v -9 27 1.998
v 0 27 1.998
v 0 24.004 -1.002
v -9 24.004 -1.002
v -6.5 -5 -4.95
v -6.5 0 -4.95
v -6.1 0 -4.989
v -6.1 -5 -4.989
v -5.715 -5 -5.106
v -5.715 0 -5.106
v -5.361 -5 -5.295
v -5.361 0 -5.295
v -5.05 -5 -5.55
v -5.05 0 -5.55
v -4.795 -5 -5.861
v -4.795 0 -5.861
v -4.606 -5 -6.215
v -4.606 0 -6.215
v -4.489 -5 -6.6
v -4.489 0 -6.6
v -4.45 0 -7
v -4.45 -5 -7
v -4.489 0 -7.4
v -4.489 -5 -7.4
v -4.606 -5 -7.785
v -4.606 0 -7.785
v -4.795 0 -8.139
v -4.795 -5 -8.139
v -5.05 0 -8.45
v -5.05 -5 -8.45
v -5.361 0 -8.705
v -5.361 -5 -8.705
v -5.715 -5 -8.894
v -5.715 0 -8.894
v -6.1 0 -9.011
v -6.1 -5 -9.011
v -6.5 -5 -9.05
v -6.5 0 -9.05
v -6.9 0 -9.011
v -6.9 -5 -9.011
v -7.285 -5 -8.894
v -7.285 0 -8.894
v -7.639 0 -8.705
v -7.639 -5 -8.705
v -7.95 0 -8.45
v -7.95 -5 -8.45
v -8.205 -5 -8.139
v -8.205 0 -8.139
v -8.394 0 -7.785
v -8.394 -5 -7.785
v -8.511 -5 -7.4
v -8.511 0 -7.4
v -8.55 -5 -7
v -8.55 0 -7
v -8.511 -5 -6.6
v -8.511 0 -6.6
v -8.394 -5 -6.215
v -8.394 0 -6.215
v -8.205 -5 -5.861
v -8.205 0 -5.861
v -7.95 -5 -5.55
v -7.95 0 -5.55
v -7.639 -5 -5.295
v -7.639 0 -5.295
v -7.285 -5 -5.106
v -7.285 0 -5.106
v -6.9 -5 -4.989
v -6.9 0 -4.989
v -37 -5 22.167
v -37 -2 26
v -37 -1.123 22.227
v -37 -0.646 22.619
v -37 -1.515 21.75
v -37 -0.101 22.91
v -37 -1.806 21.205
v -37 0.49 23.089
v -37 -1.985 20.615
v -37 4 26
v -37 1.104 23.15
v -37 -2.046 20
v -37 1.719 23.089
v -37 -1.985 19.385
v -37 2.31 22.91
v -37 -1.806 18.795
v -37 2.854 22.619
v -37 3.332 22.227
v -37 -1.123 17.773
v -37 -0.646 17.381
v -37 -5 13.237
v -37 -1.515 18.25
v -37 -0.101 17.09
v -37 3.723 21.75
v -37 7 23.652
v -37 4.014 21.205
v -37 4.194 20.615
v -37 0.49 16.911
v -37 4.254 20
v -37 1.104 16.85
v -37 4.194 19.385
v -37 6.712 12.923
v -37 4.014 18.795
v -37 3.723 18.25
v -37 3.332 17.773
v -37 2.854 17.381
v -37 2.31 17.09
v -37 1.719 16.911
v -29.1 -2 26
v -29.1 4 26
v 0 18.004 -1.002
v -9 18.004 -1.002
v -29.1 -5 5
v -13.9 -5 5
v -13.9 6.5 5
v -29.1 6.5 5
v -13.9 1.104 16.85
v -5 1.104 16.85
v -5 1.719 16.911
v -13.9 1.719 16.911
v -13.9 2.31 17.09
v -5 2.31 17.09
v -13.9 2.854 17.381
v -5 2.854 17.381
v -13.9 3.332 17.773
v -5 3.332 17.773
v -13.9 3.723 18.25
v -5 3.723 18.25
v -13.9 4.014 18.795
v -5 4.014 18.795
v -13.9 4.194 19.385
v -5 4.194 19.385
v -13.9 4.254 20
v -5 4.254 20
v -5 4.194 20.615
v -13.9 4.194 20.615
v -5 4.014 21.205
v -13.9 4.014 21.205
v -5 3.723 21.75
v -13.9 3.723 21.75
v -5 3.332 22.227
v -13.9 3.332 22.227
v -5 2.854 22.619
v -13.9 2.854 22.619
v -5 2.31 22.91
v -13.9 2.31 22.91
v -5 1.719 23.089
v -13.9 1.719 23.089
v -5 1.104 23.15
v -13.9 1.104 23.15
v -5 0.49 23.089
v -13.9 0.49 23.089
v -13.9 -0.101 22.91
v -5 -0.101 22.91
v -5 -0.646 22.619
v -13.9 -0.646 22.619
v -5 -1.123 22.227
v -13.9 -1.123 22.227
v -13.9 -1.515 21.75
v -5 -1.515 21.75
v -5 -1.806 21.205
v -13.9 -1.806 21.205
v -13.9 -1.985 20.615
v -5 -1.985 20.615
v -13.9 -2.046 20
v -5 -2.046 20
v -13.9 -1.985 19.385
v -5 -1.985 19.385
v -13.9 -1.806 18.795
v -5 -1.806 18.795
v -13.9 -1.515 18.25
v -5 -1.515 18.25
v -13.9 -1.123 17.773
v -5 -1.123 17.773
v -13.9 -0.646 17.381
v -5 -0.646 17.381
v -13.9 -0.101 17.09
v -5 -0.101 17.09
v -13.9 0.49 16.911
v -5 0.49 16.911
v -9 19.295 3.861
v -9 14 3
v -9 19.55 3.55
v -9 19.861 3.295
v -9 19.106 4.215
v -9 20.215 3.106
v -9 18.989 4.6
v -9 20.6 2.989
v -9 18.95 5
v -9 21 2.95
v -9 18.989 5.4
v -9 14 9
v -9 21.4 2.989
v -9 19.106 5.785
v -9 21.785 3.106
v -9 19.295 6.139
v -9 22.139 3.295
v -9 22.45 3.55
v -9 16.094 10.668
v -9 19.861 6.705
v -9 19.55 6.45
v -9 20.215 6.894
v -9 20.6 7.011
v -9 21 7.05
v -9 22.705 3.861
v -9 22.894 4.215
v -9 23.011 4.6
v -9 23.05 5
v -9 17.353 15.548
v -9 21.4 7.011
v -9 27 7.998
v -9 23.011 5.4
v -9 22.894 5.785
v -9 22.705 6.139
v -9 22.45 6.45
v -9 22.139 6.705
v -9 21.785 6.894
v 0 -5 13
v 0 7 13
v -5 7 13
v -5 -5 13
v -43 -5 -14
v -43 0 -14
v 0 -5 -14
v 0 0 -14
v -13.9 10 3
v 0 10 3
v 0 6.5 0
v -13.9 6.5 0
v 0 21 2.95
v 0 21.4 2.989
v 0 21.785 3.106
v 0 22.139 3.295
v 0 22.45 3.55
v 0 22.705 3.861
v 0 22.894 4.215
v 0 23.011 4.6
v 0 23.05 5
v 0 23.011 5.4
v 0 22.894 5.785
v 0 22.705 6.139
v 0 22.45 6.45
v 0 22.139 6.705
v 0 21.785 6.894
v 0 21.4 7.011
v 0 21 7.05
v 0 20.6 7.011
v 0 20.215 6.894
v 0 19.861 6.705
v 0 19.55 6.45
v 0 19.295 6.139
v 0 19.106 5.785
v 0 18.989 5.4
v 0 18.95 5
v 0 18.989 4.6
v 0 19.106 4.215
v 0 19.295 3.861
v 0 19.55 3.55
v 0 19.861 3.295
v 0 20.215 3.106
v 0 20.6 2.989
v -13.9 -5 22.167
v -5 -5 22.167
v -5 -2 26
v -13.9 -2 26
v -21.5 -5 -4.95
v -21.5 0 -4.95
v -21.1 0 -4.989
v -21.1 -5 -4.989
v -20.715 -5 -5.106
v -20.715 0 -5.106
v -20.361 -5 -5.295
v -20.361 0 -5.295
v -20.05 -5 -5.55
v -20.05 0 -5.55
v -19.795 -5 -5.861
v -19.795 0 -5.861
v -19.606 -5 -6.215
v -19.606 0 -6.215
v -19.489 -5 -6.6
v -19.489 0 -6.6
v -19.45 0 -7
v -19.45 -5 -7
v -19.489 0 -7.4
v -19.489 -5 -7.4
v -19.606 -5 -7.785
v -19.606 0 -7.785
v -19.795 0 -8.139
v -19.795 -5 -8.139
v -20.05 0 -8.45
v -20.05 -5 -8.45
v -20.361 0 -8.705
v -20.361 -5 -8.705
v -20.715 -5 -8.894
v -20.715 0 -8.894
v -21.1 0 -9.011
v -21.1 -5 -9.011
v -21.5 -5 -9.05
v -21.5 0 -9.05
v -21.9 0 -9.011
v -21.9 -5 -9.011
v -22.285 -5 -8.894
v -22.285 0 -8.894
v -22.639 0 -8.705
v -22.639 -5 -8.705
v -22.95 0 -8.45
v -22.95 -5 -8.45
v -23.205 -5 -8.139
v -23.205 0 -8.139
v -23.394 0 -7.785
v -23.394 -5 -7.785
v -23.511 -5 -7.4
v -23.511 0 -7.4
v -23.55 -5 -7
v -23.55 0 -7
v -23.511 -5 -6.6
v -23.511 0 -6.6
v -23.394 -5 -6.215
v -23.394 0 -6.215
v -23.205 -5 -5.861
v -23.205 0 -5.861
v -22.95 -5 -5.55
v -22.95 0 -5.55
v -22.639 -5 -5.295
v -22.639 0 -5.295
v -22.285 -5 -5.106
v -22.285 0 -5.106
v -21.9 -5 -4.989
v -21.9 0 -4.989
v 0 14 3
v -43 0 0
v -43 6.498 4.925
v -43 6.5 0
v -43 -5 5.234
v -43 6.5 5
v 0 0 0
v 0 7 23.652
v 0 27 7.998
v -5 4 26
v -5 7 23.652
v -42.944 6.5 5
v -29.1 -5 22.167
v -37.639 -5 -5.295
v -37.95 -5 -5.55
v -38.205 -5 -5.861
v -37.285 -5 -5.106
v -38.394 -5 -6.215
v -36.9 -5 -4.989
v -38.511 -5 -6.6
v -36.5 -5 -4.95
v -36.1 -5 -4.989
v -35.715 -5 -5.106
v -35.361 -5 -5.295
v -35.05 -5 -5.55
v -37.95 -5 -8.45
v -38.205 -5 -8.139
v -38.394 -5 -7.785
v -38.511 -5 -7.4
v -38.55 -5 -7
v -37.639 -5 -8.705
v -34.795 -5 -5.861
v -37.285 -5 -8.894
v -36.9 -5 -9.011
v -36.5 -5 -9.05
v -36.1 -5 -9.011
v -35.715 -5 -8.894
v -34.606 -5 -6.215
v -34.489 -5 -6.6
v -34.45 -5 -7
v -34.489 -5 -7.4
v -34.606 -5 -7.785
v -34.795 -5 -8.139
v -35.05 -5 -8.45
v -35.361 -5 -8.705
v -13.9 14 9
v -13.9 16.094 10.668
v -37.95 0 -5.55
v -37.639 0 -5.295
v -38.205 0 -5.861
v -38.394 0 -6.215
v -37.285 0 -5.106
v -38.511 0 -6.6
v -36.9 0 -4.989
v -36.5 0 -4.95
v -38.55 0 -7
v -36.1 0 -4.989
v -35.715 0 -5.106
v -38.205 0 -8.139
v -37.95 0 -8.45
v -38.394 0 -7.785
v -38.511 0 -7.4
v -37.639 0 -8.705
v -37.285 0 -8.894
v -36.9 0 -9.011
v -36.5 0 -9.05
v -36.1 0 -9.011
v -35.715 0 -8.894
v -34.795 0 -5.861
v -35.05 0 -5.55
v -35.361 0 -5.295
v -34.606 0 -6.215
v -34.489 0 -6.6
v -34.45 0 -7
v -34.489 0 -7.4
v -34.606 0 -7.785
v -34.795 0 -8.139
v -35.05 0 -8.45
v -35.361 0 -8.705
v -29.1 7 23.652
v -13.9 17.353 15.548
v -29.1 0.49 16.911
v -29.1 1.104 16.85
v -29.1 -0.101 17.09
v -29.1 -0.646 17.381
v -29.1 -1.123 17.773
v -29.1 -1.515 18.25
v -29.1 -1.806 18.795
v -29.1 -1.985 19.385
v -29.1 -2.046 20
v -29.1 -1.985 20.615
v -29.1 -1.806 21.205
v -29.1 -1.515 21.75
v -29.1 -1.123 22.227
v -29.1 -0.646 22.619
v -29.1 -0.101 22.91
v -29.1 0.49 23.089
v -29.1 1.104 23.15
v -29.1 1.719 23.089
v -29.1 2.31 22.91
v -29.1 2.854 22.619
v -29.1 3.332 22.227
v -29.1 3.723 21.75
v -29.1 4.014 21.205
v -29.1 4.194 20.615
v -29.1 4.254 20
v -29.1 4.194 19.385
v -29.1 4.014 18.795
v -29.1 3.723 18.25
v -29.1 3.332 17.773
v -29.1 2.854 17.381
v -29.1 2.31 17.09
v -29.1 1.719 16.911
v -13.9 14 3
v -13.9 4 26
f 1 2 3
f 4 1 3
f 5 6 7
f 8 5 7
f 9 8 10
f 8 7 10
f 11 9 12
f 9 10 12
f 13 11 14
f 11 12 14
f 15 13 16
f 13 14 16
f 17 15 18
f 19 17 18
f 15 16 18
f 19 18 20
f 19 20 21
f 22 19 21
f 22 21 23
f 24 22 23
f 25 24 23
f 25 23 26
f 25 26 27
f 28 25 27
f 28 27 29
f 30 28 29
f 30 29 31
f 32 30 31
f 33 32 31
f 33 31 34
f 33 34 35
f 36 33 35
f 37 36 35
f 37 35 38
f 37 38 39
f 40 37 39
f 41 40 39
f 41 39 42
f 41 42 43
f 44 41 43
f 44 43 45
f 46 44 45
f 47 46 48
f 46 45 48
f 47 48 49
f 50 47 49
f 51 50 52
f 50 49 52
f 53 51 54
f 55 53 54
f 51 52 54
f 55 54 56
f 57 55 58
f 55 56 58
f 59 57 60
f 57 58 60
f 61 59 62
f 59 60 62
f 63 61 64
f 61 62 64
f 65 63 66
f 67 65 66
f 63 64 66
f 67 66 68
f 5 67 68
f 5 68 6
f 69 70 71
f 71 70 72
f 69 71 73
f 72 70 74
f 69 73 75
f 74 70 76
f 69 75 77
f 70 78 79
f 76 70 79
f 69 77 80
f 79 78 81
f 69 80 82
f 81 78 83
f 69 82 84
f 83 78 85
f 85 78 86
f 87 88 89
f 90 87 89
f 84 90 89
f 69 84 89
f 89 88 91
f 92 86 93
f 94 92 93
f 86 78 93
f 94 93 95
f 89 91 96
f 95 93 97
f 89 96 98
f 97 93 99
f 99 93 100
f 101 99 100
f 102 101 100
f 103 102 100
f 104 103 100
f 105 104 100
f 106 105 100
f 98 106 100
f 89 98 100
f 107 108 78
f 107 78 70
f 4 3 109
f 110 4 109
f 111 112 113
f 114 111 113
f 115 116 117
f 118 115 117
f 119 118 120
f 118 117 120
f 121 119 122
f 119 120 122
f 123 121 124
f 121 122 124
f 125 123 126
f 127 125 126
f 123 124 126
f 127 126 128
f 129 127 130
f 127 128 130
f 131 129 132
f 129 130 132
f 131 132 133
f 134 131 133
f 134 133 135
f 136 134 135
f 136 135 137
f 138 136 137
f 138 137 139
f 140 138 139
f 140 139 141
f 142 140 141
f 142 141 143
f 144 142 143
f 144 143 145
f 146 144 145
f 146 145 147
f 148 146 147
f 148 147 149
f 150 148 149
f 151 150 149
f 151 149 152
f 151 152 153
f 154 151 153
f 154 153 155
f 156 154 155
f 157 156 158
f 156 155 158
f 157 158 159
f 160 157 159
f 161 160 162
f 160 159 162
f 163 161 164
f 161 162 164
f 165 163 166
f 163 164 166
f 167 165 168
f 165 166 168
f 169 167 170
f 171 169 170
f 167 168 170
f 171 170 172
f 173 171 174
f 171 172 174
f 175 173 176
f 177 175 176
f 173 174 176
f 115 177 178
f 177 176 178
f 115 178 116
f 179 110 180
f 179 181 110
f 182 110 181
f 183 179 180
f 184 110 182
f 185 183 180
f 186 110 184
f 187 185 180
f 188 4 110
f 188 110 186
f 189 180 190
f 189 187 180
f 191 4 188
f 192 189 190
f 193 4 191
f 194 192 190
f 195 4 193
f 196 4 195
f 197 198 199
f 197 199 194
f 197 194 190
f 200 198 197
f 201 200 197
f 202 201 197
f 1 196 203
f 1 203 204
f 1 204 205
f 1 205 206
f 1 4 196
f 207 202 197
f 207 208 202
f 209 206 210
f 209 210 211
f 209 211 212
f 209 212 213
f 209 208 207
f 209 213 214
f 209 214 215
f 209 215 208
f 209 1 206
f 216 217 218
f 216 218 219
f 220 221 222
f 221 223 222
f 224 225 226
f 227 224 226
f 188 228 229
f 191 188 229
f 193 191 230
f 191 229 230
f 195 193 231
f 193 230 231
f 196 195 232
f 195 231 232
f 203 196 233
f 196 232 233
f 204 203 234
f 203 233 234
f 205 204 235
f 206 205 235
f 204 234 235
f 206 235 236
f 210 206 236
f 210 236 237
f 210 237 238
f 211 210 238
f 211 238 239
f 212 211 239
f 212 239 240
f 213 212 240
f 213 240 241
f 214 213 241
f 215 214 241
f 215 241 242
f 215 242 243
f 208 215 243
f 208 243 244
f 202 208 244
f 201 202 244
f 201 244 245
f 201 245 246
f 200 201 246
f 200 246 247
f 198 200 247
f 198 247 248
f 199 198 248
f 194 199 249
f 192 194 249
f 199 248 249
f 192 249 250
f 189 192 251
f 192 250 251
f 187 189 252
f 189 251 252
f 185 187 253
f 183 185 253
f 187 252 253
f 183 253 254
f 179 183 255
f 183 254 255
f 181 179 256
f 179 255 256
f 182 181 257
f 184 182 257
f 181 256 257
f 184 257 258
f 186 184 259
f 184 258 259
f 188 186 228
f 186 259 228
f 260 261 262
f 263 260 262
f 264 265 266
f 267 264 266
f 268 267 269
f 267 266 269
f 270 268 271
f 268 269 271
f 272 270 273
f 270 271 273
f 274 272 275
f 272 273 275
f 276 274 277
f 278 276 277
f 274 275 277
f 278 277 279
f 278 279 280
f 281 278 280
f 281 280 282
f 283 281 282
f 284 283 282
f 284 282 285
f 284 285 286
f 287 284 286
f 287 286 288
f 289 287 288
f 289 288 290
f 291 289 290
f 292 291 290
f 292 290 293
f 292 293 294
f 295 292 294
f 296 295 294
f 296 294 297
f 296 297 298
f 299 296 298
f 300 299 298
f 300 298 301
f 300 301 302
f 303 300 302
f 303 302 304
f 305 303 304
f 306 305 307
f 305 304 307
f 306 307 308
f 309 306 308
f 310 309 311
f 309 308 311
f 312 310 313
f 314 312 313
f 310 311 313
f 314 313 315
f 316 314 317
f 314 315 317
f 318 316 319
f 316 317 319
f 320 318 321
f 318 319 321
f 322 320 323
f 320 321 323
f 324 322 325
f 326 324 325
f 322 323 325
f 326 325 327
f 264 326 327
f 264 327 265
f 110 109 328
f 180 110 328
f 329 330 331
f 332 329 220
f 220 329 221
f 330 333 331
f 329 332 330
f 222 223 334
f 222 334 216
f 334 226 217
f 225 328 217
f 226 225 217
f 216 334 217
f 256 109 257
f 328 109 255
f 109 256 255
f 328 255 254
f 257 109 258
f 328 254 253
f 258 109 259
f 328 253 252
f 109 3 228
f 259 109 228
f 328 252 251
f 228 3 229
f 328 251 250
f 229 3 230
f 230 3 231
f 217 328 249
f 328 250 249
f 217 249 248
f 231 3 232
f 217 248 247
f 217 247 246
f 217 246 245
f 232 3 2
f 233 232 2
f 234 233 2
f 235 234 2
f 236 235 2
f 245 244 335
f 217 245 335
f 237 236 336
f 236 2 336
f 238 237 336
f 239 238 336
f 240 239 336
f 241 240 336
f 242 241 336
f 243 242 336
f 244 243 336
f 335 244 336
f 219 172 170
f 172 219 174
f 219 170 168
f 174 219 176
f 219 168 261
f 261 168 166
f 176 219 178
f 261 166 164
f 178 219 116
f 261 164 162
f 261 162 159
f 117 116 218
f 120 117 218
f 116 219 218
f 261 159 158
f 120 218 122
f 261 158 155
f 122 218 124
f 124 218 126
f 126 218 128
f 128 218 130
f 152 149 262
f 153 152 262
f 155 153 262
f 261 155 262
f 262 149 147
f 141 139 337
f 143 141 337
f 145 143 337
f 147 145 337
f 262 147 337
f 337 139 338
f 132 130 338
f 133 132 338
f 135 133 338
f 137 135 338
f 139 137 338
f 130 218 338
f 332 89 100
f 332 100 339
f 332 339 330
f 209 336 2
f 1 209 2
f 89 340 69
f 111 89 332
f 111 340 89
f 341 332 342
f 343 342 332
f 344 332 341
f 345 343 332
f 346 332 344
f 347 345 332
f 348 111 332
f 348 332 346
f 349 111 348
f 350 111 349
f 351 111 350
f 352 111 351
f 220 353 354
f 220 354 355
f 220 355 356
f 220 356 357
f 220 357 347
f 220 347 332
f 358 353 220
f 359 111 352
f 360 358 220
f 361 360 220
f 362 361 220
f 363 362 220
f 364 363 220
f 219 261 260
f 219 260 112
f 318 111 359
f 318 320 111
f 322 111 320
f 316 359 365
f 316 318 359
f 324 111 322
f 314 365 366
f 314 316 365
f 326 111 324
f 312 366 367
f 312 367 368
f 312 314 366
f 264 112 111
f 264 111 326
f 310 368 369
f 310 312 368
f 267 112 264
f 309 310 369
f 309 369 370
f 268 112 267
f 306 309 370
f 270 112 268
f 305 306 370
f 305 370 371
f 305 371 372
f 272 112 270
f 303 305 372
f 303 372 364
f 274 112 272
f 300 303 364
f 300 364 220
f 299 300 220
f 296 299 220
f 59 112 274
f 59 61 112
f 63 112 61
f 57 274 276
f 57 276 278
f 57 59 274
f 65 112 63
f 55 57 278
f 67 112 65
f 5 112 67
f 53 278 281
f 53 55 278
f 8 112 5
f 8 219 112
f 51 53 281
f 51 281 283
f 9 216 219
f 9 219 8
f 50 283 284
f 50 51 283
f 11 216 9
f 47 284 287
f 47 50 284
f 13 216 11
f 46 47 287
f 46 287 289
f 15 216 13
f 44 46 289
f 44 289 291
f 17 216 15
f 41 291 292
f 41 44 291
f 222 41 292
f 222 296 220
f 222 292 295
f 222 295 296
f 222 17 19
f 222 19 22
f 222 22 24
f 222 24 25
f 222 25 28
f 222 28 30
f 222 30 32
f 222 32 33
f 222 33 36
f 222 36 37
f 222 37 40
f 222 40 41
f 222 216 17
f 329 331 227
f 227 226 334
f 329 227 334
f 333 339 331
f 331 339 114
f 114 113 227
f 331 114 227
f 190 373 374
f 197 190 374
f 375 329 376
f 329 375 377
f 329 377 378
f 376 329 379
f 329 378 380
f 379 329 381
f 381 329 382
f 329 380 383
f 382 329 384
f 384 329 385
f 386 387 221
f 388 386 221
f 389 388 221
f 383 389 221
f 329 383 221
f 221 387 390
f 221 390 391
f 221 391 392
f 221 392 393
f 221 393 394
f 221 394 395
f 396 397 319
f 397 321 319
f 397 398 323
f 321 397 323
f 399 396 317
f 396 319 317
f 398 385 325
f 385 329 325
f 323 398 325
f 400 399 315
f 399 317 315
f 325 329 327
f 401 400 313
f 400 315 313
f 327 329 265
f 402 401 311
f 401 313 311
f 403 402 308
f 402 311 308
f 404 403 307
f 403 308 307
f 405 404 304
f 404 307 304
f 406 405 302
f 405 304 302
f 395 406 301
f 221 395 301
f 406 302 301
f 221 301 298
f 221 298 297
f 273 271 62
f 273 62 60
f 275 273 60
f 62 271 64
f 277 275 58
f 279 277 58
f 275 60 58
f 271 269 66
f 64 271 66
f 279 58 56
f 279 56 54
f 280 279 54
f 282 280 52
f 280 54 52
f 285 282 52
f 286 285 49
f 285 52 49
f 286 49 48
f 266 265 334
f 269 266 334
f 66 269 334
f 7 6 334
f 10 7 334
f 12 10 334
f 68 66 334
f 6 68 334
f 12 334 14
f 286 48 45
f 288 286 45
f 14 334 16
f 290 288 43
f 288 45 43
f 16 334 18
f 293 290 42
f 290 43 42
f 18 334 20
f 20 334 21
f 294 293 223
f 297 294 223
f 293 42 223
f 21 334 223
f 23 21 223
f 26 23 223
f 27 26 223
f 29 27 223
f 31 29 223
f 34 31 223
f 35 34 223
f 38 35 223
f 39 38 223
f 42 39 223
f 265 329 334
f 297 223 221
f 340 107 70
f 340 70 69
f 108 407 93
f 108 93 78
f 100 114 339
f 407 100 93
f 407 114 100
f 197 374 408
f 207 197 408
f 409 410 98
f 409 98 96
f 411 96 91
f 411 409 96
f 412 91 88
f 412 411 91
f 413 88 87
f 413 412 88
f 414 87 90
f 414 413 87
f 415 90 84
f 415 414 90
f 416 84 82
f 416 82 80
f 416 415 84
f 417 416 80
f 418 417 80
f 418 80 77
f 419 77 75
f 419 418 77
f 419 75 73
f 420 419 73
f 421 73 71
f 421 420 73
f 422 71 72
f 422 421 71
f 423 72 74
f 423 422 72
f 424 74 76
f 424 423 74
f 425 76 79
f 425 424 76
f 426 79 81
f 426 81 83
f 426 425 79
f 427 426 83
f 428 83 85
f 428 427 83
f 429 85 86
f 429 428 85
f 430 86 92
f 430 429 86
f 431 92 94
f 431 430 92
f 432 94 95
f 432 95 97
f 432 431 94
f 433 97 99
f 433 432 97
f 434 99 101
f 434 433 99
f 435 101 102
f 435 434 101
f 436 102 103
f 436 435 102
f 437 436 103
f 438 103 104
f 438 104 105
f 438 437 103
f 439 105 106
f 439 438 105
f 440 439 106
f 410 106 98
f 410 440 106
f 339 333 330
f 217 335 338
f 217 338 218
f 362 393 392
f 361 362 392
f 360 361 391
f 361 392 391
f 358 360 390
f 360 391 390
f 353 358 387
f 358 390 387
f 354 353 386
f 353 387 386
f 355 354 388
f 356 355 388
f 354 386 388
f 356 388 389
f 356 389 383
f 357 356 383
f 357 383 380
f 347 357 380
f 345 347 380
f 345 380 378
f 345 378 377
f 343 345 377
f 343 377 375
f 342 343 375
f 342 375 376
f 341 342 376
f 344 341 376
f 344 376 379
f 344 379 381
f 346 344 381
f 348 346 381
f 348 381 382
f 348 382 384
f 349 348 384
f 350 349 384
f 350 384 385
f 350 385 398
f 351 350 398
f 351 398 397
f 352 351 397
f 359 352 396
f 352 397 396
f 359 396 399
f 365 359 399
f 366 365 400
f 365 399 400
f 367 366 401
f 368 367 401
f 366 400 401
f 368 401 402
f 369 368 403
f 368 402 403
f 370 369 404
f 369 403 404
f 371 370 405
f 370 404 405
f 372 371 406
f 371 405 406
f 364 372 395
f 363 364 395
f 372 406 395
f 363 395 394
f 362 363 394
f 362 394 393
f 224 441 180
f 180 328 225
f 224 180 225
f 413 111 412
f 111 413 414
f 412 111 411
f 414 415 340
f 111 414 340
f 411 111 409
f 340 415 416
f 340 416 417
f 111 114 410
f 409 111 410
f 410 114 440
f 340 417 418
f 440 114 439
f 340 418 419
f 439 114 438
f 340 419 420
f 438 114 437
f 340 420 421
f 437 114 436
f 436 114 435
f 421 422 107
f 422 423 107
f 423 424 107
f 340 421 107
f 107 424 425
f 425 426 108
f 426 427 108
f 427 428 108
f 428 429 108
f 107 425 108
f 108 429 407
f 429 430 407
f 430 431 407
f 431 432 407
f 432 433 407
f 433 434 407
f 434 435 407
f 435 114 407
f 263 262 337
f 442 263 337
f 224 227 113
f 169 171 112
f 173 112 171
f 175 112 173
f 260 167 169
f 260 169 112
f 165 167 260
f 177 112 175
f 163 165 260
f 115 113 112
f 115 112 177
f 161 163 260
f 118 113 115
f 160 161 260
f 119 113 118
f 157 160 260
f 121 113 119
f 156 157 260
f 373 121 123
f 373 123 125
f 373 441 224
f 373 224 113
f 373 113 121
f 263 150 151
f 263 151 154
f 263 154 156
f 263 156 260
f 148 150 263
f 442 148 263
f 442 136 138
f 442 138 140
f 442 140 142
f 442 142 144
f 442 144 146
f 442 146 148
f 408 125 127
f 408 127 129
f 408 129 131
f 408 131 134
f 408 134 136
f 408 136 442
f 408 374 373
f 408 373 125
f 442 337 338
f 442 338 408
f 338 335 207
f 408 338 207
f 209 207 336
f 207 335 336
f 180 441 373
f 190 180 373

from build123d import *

# Parameters (mm, degrees)
SKETCH1_R           = 3.15
SKETCH1_R_2         = 2.05
BOSS_EXTRUDE1_DEPTH = 13.9
CUT_EXTRUDE1_DEPTH  = 5
CUT_EXTRUDE2_DEPTH  = 4.9
BOSS_EXTRUDE2_DEPTH = 29.1
BOSS_EXTRUDE3_START = 15.2
SKETCH6_R           = 3.15
BOSS_EXTRUDE3_DEPTH = 7.9
BOSS_EXTRUDE4_DEPTH = 6
CUT_EXTRUDE3_DEPTH  = 23
SKETCH9_R           = 2.05
CUT_EXTRUDE4_DEPTH  = 23


with BuildPart() as part:
    # Sketch1 → Boss-Extrude1 (new body)
    with BuildSketch(Plane(origin=(0, 0, 0), x_dir=(0, 0, -1), z_dir=(1, 0, 0))):
        Polygon((0, 0), (14, 0), (14, -5), (-22.167074323, -5), (-26, -2), (-26, 4), (-7.998085585, 27), (-1.998085585, 27), (1.001914415, 24.003735659), (1.001914415, 18.003735659), (-3.00034998, 14), (-3.00034998, 10), (0, 6.5), align=None)
        with Locations((-20, 1.104234986)):
            Circle(SKETCH1_R, mode=Mode.SUBTRACT)
        with Locations((-5, 21)):
            Circle(SKETCH1_R_2, mode=Mode.SUBTRACT)
    extrude(amount=-BOSS_EXTRUDE1_DEPTH)

    # Sketch2 → Cut-Extrude1 (cut)
    with BuildSketch(Plane(origin=(0, 0, 0), x_dir=(0, 0, -1), z_dir=(1, 0, 0))):
        Polygon((-23.651924207, 7), (-13, 7), (-13, -5), (-22.167074323, -5), (-26, -2), (-26, 4), align=None)
    extrude(amount=-CUT_EXTRUDE1_DEPTH, mode=Mode.SUBTRACT)

    # Sketch4 → Cut-Extrude2 (cut)
    with BuildSketch(Plane.ZY.offset(13.9)):
        Polygon((3.00034998, 14), (9.00034998, 14), (10.668359731, 16.093612192), (15.548359731, 17.353453452), (7.998085585, 27), (1.998085585, 27), (-1.001914415, 24.003735659), (-1.001914415, 18.003735659), align=None)
    extrude(amount=-CUT_EXTRUDE2_DEPTH, mode=Mode.SUBTRACT)

    # Sketch5 → Boss-Extrude2 (add)
    with BuildSketch(Plane.ZY.offset(13.9)):
        Polygon((0, 0), (-14, 0), (-14, -5), (5, -5), (5, 6.5), (0, 6.5), align=None)
    extrude(amount=BOSS_EXTRUDE2_DEPTH)

    # Sketch6 → Boss-Extrude3 (add)
    with BuildSketch(Plane.ZY.offset(13.9).offset(BOSS_EXTRUDE3_START)):
        Polygon((5, 6.5), (5, -5), (22.167074323, -5), (26, -2), (26, 4), (23.651924207, 7), align=None)
        with Locations(Location((20, 1.104234986, 0), (0, 0, 180))):
            Circle(SKETCH6_R, mode=Mode.SUBTRACT)
    extrude(amount=BOSS_EXTRUDE3_DEPTH)

    # Sketch7 → Boss-Extrude4 (add)
    with BuildSketch(Plane.ZY.offset(37)):
        Polygon((5, 6.5), (23.651924207, 7), (26, 4), (26, -2), (22.167074323, -5), (5, -5), align=None)
    extrude(amount=BOSS_EXTRUDE4_DEPTH)

    # Sketch8 → Cut-Extrude3 (cut)
    with BuildSketch(Plane(origin=(0, 6.361394216, -0.170529168), x_dir=(1, 0, 0), z_dir=(0, 0.9996408889737135, -0.026797259036029572))):
        Polygon((-37, -26.097852149), (-37, -13.097852149), (-43, -5.097852149), (-43, -26.097852149), align=None)
    extrude(amount=-CUT_EXTRUDE3_DEPTH, mode=Mode.SUBTRACT)

    # Sketch9 → Cut-Extrude4 (cut)
    with BuildSketch(Plane(origin=(0, 0, 0), x_dir=(1, 0, 0), z_dir=(0, 1, 0))):
        with Locations(Location((-21.5, 7, 0), (0, 0, 270))):
            Circle(SKETCH9_R)
        with Locations(Location((-6.5, 7, 0), (0, 0, 270))):
            Circle(SKETCH9_R)
        with Locations(Location((-36.5, 7, 0), (0, 0, 90))):
            Circle(SKETCH9_R)
    extrude(amount=-CUT_EXTRUDE4_DEPTH, mode=Mode.SUBTRACT)


solid = part.part
